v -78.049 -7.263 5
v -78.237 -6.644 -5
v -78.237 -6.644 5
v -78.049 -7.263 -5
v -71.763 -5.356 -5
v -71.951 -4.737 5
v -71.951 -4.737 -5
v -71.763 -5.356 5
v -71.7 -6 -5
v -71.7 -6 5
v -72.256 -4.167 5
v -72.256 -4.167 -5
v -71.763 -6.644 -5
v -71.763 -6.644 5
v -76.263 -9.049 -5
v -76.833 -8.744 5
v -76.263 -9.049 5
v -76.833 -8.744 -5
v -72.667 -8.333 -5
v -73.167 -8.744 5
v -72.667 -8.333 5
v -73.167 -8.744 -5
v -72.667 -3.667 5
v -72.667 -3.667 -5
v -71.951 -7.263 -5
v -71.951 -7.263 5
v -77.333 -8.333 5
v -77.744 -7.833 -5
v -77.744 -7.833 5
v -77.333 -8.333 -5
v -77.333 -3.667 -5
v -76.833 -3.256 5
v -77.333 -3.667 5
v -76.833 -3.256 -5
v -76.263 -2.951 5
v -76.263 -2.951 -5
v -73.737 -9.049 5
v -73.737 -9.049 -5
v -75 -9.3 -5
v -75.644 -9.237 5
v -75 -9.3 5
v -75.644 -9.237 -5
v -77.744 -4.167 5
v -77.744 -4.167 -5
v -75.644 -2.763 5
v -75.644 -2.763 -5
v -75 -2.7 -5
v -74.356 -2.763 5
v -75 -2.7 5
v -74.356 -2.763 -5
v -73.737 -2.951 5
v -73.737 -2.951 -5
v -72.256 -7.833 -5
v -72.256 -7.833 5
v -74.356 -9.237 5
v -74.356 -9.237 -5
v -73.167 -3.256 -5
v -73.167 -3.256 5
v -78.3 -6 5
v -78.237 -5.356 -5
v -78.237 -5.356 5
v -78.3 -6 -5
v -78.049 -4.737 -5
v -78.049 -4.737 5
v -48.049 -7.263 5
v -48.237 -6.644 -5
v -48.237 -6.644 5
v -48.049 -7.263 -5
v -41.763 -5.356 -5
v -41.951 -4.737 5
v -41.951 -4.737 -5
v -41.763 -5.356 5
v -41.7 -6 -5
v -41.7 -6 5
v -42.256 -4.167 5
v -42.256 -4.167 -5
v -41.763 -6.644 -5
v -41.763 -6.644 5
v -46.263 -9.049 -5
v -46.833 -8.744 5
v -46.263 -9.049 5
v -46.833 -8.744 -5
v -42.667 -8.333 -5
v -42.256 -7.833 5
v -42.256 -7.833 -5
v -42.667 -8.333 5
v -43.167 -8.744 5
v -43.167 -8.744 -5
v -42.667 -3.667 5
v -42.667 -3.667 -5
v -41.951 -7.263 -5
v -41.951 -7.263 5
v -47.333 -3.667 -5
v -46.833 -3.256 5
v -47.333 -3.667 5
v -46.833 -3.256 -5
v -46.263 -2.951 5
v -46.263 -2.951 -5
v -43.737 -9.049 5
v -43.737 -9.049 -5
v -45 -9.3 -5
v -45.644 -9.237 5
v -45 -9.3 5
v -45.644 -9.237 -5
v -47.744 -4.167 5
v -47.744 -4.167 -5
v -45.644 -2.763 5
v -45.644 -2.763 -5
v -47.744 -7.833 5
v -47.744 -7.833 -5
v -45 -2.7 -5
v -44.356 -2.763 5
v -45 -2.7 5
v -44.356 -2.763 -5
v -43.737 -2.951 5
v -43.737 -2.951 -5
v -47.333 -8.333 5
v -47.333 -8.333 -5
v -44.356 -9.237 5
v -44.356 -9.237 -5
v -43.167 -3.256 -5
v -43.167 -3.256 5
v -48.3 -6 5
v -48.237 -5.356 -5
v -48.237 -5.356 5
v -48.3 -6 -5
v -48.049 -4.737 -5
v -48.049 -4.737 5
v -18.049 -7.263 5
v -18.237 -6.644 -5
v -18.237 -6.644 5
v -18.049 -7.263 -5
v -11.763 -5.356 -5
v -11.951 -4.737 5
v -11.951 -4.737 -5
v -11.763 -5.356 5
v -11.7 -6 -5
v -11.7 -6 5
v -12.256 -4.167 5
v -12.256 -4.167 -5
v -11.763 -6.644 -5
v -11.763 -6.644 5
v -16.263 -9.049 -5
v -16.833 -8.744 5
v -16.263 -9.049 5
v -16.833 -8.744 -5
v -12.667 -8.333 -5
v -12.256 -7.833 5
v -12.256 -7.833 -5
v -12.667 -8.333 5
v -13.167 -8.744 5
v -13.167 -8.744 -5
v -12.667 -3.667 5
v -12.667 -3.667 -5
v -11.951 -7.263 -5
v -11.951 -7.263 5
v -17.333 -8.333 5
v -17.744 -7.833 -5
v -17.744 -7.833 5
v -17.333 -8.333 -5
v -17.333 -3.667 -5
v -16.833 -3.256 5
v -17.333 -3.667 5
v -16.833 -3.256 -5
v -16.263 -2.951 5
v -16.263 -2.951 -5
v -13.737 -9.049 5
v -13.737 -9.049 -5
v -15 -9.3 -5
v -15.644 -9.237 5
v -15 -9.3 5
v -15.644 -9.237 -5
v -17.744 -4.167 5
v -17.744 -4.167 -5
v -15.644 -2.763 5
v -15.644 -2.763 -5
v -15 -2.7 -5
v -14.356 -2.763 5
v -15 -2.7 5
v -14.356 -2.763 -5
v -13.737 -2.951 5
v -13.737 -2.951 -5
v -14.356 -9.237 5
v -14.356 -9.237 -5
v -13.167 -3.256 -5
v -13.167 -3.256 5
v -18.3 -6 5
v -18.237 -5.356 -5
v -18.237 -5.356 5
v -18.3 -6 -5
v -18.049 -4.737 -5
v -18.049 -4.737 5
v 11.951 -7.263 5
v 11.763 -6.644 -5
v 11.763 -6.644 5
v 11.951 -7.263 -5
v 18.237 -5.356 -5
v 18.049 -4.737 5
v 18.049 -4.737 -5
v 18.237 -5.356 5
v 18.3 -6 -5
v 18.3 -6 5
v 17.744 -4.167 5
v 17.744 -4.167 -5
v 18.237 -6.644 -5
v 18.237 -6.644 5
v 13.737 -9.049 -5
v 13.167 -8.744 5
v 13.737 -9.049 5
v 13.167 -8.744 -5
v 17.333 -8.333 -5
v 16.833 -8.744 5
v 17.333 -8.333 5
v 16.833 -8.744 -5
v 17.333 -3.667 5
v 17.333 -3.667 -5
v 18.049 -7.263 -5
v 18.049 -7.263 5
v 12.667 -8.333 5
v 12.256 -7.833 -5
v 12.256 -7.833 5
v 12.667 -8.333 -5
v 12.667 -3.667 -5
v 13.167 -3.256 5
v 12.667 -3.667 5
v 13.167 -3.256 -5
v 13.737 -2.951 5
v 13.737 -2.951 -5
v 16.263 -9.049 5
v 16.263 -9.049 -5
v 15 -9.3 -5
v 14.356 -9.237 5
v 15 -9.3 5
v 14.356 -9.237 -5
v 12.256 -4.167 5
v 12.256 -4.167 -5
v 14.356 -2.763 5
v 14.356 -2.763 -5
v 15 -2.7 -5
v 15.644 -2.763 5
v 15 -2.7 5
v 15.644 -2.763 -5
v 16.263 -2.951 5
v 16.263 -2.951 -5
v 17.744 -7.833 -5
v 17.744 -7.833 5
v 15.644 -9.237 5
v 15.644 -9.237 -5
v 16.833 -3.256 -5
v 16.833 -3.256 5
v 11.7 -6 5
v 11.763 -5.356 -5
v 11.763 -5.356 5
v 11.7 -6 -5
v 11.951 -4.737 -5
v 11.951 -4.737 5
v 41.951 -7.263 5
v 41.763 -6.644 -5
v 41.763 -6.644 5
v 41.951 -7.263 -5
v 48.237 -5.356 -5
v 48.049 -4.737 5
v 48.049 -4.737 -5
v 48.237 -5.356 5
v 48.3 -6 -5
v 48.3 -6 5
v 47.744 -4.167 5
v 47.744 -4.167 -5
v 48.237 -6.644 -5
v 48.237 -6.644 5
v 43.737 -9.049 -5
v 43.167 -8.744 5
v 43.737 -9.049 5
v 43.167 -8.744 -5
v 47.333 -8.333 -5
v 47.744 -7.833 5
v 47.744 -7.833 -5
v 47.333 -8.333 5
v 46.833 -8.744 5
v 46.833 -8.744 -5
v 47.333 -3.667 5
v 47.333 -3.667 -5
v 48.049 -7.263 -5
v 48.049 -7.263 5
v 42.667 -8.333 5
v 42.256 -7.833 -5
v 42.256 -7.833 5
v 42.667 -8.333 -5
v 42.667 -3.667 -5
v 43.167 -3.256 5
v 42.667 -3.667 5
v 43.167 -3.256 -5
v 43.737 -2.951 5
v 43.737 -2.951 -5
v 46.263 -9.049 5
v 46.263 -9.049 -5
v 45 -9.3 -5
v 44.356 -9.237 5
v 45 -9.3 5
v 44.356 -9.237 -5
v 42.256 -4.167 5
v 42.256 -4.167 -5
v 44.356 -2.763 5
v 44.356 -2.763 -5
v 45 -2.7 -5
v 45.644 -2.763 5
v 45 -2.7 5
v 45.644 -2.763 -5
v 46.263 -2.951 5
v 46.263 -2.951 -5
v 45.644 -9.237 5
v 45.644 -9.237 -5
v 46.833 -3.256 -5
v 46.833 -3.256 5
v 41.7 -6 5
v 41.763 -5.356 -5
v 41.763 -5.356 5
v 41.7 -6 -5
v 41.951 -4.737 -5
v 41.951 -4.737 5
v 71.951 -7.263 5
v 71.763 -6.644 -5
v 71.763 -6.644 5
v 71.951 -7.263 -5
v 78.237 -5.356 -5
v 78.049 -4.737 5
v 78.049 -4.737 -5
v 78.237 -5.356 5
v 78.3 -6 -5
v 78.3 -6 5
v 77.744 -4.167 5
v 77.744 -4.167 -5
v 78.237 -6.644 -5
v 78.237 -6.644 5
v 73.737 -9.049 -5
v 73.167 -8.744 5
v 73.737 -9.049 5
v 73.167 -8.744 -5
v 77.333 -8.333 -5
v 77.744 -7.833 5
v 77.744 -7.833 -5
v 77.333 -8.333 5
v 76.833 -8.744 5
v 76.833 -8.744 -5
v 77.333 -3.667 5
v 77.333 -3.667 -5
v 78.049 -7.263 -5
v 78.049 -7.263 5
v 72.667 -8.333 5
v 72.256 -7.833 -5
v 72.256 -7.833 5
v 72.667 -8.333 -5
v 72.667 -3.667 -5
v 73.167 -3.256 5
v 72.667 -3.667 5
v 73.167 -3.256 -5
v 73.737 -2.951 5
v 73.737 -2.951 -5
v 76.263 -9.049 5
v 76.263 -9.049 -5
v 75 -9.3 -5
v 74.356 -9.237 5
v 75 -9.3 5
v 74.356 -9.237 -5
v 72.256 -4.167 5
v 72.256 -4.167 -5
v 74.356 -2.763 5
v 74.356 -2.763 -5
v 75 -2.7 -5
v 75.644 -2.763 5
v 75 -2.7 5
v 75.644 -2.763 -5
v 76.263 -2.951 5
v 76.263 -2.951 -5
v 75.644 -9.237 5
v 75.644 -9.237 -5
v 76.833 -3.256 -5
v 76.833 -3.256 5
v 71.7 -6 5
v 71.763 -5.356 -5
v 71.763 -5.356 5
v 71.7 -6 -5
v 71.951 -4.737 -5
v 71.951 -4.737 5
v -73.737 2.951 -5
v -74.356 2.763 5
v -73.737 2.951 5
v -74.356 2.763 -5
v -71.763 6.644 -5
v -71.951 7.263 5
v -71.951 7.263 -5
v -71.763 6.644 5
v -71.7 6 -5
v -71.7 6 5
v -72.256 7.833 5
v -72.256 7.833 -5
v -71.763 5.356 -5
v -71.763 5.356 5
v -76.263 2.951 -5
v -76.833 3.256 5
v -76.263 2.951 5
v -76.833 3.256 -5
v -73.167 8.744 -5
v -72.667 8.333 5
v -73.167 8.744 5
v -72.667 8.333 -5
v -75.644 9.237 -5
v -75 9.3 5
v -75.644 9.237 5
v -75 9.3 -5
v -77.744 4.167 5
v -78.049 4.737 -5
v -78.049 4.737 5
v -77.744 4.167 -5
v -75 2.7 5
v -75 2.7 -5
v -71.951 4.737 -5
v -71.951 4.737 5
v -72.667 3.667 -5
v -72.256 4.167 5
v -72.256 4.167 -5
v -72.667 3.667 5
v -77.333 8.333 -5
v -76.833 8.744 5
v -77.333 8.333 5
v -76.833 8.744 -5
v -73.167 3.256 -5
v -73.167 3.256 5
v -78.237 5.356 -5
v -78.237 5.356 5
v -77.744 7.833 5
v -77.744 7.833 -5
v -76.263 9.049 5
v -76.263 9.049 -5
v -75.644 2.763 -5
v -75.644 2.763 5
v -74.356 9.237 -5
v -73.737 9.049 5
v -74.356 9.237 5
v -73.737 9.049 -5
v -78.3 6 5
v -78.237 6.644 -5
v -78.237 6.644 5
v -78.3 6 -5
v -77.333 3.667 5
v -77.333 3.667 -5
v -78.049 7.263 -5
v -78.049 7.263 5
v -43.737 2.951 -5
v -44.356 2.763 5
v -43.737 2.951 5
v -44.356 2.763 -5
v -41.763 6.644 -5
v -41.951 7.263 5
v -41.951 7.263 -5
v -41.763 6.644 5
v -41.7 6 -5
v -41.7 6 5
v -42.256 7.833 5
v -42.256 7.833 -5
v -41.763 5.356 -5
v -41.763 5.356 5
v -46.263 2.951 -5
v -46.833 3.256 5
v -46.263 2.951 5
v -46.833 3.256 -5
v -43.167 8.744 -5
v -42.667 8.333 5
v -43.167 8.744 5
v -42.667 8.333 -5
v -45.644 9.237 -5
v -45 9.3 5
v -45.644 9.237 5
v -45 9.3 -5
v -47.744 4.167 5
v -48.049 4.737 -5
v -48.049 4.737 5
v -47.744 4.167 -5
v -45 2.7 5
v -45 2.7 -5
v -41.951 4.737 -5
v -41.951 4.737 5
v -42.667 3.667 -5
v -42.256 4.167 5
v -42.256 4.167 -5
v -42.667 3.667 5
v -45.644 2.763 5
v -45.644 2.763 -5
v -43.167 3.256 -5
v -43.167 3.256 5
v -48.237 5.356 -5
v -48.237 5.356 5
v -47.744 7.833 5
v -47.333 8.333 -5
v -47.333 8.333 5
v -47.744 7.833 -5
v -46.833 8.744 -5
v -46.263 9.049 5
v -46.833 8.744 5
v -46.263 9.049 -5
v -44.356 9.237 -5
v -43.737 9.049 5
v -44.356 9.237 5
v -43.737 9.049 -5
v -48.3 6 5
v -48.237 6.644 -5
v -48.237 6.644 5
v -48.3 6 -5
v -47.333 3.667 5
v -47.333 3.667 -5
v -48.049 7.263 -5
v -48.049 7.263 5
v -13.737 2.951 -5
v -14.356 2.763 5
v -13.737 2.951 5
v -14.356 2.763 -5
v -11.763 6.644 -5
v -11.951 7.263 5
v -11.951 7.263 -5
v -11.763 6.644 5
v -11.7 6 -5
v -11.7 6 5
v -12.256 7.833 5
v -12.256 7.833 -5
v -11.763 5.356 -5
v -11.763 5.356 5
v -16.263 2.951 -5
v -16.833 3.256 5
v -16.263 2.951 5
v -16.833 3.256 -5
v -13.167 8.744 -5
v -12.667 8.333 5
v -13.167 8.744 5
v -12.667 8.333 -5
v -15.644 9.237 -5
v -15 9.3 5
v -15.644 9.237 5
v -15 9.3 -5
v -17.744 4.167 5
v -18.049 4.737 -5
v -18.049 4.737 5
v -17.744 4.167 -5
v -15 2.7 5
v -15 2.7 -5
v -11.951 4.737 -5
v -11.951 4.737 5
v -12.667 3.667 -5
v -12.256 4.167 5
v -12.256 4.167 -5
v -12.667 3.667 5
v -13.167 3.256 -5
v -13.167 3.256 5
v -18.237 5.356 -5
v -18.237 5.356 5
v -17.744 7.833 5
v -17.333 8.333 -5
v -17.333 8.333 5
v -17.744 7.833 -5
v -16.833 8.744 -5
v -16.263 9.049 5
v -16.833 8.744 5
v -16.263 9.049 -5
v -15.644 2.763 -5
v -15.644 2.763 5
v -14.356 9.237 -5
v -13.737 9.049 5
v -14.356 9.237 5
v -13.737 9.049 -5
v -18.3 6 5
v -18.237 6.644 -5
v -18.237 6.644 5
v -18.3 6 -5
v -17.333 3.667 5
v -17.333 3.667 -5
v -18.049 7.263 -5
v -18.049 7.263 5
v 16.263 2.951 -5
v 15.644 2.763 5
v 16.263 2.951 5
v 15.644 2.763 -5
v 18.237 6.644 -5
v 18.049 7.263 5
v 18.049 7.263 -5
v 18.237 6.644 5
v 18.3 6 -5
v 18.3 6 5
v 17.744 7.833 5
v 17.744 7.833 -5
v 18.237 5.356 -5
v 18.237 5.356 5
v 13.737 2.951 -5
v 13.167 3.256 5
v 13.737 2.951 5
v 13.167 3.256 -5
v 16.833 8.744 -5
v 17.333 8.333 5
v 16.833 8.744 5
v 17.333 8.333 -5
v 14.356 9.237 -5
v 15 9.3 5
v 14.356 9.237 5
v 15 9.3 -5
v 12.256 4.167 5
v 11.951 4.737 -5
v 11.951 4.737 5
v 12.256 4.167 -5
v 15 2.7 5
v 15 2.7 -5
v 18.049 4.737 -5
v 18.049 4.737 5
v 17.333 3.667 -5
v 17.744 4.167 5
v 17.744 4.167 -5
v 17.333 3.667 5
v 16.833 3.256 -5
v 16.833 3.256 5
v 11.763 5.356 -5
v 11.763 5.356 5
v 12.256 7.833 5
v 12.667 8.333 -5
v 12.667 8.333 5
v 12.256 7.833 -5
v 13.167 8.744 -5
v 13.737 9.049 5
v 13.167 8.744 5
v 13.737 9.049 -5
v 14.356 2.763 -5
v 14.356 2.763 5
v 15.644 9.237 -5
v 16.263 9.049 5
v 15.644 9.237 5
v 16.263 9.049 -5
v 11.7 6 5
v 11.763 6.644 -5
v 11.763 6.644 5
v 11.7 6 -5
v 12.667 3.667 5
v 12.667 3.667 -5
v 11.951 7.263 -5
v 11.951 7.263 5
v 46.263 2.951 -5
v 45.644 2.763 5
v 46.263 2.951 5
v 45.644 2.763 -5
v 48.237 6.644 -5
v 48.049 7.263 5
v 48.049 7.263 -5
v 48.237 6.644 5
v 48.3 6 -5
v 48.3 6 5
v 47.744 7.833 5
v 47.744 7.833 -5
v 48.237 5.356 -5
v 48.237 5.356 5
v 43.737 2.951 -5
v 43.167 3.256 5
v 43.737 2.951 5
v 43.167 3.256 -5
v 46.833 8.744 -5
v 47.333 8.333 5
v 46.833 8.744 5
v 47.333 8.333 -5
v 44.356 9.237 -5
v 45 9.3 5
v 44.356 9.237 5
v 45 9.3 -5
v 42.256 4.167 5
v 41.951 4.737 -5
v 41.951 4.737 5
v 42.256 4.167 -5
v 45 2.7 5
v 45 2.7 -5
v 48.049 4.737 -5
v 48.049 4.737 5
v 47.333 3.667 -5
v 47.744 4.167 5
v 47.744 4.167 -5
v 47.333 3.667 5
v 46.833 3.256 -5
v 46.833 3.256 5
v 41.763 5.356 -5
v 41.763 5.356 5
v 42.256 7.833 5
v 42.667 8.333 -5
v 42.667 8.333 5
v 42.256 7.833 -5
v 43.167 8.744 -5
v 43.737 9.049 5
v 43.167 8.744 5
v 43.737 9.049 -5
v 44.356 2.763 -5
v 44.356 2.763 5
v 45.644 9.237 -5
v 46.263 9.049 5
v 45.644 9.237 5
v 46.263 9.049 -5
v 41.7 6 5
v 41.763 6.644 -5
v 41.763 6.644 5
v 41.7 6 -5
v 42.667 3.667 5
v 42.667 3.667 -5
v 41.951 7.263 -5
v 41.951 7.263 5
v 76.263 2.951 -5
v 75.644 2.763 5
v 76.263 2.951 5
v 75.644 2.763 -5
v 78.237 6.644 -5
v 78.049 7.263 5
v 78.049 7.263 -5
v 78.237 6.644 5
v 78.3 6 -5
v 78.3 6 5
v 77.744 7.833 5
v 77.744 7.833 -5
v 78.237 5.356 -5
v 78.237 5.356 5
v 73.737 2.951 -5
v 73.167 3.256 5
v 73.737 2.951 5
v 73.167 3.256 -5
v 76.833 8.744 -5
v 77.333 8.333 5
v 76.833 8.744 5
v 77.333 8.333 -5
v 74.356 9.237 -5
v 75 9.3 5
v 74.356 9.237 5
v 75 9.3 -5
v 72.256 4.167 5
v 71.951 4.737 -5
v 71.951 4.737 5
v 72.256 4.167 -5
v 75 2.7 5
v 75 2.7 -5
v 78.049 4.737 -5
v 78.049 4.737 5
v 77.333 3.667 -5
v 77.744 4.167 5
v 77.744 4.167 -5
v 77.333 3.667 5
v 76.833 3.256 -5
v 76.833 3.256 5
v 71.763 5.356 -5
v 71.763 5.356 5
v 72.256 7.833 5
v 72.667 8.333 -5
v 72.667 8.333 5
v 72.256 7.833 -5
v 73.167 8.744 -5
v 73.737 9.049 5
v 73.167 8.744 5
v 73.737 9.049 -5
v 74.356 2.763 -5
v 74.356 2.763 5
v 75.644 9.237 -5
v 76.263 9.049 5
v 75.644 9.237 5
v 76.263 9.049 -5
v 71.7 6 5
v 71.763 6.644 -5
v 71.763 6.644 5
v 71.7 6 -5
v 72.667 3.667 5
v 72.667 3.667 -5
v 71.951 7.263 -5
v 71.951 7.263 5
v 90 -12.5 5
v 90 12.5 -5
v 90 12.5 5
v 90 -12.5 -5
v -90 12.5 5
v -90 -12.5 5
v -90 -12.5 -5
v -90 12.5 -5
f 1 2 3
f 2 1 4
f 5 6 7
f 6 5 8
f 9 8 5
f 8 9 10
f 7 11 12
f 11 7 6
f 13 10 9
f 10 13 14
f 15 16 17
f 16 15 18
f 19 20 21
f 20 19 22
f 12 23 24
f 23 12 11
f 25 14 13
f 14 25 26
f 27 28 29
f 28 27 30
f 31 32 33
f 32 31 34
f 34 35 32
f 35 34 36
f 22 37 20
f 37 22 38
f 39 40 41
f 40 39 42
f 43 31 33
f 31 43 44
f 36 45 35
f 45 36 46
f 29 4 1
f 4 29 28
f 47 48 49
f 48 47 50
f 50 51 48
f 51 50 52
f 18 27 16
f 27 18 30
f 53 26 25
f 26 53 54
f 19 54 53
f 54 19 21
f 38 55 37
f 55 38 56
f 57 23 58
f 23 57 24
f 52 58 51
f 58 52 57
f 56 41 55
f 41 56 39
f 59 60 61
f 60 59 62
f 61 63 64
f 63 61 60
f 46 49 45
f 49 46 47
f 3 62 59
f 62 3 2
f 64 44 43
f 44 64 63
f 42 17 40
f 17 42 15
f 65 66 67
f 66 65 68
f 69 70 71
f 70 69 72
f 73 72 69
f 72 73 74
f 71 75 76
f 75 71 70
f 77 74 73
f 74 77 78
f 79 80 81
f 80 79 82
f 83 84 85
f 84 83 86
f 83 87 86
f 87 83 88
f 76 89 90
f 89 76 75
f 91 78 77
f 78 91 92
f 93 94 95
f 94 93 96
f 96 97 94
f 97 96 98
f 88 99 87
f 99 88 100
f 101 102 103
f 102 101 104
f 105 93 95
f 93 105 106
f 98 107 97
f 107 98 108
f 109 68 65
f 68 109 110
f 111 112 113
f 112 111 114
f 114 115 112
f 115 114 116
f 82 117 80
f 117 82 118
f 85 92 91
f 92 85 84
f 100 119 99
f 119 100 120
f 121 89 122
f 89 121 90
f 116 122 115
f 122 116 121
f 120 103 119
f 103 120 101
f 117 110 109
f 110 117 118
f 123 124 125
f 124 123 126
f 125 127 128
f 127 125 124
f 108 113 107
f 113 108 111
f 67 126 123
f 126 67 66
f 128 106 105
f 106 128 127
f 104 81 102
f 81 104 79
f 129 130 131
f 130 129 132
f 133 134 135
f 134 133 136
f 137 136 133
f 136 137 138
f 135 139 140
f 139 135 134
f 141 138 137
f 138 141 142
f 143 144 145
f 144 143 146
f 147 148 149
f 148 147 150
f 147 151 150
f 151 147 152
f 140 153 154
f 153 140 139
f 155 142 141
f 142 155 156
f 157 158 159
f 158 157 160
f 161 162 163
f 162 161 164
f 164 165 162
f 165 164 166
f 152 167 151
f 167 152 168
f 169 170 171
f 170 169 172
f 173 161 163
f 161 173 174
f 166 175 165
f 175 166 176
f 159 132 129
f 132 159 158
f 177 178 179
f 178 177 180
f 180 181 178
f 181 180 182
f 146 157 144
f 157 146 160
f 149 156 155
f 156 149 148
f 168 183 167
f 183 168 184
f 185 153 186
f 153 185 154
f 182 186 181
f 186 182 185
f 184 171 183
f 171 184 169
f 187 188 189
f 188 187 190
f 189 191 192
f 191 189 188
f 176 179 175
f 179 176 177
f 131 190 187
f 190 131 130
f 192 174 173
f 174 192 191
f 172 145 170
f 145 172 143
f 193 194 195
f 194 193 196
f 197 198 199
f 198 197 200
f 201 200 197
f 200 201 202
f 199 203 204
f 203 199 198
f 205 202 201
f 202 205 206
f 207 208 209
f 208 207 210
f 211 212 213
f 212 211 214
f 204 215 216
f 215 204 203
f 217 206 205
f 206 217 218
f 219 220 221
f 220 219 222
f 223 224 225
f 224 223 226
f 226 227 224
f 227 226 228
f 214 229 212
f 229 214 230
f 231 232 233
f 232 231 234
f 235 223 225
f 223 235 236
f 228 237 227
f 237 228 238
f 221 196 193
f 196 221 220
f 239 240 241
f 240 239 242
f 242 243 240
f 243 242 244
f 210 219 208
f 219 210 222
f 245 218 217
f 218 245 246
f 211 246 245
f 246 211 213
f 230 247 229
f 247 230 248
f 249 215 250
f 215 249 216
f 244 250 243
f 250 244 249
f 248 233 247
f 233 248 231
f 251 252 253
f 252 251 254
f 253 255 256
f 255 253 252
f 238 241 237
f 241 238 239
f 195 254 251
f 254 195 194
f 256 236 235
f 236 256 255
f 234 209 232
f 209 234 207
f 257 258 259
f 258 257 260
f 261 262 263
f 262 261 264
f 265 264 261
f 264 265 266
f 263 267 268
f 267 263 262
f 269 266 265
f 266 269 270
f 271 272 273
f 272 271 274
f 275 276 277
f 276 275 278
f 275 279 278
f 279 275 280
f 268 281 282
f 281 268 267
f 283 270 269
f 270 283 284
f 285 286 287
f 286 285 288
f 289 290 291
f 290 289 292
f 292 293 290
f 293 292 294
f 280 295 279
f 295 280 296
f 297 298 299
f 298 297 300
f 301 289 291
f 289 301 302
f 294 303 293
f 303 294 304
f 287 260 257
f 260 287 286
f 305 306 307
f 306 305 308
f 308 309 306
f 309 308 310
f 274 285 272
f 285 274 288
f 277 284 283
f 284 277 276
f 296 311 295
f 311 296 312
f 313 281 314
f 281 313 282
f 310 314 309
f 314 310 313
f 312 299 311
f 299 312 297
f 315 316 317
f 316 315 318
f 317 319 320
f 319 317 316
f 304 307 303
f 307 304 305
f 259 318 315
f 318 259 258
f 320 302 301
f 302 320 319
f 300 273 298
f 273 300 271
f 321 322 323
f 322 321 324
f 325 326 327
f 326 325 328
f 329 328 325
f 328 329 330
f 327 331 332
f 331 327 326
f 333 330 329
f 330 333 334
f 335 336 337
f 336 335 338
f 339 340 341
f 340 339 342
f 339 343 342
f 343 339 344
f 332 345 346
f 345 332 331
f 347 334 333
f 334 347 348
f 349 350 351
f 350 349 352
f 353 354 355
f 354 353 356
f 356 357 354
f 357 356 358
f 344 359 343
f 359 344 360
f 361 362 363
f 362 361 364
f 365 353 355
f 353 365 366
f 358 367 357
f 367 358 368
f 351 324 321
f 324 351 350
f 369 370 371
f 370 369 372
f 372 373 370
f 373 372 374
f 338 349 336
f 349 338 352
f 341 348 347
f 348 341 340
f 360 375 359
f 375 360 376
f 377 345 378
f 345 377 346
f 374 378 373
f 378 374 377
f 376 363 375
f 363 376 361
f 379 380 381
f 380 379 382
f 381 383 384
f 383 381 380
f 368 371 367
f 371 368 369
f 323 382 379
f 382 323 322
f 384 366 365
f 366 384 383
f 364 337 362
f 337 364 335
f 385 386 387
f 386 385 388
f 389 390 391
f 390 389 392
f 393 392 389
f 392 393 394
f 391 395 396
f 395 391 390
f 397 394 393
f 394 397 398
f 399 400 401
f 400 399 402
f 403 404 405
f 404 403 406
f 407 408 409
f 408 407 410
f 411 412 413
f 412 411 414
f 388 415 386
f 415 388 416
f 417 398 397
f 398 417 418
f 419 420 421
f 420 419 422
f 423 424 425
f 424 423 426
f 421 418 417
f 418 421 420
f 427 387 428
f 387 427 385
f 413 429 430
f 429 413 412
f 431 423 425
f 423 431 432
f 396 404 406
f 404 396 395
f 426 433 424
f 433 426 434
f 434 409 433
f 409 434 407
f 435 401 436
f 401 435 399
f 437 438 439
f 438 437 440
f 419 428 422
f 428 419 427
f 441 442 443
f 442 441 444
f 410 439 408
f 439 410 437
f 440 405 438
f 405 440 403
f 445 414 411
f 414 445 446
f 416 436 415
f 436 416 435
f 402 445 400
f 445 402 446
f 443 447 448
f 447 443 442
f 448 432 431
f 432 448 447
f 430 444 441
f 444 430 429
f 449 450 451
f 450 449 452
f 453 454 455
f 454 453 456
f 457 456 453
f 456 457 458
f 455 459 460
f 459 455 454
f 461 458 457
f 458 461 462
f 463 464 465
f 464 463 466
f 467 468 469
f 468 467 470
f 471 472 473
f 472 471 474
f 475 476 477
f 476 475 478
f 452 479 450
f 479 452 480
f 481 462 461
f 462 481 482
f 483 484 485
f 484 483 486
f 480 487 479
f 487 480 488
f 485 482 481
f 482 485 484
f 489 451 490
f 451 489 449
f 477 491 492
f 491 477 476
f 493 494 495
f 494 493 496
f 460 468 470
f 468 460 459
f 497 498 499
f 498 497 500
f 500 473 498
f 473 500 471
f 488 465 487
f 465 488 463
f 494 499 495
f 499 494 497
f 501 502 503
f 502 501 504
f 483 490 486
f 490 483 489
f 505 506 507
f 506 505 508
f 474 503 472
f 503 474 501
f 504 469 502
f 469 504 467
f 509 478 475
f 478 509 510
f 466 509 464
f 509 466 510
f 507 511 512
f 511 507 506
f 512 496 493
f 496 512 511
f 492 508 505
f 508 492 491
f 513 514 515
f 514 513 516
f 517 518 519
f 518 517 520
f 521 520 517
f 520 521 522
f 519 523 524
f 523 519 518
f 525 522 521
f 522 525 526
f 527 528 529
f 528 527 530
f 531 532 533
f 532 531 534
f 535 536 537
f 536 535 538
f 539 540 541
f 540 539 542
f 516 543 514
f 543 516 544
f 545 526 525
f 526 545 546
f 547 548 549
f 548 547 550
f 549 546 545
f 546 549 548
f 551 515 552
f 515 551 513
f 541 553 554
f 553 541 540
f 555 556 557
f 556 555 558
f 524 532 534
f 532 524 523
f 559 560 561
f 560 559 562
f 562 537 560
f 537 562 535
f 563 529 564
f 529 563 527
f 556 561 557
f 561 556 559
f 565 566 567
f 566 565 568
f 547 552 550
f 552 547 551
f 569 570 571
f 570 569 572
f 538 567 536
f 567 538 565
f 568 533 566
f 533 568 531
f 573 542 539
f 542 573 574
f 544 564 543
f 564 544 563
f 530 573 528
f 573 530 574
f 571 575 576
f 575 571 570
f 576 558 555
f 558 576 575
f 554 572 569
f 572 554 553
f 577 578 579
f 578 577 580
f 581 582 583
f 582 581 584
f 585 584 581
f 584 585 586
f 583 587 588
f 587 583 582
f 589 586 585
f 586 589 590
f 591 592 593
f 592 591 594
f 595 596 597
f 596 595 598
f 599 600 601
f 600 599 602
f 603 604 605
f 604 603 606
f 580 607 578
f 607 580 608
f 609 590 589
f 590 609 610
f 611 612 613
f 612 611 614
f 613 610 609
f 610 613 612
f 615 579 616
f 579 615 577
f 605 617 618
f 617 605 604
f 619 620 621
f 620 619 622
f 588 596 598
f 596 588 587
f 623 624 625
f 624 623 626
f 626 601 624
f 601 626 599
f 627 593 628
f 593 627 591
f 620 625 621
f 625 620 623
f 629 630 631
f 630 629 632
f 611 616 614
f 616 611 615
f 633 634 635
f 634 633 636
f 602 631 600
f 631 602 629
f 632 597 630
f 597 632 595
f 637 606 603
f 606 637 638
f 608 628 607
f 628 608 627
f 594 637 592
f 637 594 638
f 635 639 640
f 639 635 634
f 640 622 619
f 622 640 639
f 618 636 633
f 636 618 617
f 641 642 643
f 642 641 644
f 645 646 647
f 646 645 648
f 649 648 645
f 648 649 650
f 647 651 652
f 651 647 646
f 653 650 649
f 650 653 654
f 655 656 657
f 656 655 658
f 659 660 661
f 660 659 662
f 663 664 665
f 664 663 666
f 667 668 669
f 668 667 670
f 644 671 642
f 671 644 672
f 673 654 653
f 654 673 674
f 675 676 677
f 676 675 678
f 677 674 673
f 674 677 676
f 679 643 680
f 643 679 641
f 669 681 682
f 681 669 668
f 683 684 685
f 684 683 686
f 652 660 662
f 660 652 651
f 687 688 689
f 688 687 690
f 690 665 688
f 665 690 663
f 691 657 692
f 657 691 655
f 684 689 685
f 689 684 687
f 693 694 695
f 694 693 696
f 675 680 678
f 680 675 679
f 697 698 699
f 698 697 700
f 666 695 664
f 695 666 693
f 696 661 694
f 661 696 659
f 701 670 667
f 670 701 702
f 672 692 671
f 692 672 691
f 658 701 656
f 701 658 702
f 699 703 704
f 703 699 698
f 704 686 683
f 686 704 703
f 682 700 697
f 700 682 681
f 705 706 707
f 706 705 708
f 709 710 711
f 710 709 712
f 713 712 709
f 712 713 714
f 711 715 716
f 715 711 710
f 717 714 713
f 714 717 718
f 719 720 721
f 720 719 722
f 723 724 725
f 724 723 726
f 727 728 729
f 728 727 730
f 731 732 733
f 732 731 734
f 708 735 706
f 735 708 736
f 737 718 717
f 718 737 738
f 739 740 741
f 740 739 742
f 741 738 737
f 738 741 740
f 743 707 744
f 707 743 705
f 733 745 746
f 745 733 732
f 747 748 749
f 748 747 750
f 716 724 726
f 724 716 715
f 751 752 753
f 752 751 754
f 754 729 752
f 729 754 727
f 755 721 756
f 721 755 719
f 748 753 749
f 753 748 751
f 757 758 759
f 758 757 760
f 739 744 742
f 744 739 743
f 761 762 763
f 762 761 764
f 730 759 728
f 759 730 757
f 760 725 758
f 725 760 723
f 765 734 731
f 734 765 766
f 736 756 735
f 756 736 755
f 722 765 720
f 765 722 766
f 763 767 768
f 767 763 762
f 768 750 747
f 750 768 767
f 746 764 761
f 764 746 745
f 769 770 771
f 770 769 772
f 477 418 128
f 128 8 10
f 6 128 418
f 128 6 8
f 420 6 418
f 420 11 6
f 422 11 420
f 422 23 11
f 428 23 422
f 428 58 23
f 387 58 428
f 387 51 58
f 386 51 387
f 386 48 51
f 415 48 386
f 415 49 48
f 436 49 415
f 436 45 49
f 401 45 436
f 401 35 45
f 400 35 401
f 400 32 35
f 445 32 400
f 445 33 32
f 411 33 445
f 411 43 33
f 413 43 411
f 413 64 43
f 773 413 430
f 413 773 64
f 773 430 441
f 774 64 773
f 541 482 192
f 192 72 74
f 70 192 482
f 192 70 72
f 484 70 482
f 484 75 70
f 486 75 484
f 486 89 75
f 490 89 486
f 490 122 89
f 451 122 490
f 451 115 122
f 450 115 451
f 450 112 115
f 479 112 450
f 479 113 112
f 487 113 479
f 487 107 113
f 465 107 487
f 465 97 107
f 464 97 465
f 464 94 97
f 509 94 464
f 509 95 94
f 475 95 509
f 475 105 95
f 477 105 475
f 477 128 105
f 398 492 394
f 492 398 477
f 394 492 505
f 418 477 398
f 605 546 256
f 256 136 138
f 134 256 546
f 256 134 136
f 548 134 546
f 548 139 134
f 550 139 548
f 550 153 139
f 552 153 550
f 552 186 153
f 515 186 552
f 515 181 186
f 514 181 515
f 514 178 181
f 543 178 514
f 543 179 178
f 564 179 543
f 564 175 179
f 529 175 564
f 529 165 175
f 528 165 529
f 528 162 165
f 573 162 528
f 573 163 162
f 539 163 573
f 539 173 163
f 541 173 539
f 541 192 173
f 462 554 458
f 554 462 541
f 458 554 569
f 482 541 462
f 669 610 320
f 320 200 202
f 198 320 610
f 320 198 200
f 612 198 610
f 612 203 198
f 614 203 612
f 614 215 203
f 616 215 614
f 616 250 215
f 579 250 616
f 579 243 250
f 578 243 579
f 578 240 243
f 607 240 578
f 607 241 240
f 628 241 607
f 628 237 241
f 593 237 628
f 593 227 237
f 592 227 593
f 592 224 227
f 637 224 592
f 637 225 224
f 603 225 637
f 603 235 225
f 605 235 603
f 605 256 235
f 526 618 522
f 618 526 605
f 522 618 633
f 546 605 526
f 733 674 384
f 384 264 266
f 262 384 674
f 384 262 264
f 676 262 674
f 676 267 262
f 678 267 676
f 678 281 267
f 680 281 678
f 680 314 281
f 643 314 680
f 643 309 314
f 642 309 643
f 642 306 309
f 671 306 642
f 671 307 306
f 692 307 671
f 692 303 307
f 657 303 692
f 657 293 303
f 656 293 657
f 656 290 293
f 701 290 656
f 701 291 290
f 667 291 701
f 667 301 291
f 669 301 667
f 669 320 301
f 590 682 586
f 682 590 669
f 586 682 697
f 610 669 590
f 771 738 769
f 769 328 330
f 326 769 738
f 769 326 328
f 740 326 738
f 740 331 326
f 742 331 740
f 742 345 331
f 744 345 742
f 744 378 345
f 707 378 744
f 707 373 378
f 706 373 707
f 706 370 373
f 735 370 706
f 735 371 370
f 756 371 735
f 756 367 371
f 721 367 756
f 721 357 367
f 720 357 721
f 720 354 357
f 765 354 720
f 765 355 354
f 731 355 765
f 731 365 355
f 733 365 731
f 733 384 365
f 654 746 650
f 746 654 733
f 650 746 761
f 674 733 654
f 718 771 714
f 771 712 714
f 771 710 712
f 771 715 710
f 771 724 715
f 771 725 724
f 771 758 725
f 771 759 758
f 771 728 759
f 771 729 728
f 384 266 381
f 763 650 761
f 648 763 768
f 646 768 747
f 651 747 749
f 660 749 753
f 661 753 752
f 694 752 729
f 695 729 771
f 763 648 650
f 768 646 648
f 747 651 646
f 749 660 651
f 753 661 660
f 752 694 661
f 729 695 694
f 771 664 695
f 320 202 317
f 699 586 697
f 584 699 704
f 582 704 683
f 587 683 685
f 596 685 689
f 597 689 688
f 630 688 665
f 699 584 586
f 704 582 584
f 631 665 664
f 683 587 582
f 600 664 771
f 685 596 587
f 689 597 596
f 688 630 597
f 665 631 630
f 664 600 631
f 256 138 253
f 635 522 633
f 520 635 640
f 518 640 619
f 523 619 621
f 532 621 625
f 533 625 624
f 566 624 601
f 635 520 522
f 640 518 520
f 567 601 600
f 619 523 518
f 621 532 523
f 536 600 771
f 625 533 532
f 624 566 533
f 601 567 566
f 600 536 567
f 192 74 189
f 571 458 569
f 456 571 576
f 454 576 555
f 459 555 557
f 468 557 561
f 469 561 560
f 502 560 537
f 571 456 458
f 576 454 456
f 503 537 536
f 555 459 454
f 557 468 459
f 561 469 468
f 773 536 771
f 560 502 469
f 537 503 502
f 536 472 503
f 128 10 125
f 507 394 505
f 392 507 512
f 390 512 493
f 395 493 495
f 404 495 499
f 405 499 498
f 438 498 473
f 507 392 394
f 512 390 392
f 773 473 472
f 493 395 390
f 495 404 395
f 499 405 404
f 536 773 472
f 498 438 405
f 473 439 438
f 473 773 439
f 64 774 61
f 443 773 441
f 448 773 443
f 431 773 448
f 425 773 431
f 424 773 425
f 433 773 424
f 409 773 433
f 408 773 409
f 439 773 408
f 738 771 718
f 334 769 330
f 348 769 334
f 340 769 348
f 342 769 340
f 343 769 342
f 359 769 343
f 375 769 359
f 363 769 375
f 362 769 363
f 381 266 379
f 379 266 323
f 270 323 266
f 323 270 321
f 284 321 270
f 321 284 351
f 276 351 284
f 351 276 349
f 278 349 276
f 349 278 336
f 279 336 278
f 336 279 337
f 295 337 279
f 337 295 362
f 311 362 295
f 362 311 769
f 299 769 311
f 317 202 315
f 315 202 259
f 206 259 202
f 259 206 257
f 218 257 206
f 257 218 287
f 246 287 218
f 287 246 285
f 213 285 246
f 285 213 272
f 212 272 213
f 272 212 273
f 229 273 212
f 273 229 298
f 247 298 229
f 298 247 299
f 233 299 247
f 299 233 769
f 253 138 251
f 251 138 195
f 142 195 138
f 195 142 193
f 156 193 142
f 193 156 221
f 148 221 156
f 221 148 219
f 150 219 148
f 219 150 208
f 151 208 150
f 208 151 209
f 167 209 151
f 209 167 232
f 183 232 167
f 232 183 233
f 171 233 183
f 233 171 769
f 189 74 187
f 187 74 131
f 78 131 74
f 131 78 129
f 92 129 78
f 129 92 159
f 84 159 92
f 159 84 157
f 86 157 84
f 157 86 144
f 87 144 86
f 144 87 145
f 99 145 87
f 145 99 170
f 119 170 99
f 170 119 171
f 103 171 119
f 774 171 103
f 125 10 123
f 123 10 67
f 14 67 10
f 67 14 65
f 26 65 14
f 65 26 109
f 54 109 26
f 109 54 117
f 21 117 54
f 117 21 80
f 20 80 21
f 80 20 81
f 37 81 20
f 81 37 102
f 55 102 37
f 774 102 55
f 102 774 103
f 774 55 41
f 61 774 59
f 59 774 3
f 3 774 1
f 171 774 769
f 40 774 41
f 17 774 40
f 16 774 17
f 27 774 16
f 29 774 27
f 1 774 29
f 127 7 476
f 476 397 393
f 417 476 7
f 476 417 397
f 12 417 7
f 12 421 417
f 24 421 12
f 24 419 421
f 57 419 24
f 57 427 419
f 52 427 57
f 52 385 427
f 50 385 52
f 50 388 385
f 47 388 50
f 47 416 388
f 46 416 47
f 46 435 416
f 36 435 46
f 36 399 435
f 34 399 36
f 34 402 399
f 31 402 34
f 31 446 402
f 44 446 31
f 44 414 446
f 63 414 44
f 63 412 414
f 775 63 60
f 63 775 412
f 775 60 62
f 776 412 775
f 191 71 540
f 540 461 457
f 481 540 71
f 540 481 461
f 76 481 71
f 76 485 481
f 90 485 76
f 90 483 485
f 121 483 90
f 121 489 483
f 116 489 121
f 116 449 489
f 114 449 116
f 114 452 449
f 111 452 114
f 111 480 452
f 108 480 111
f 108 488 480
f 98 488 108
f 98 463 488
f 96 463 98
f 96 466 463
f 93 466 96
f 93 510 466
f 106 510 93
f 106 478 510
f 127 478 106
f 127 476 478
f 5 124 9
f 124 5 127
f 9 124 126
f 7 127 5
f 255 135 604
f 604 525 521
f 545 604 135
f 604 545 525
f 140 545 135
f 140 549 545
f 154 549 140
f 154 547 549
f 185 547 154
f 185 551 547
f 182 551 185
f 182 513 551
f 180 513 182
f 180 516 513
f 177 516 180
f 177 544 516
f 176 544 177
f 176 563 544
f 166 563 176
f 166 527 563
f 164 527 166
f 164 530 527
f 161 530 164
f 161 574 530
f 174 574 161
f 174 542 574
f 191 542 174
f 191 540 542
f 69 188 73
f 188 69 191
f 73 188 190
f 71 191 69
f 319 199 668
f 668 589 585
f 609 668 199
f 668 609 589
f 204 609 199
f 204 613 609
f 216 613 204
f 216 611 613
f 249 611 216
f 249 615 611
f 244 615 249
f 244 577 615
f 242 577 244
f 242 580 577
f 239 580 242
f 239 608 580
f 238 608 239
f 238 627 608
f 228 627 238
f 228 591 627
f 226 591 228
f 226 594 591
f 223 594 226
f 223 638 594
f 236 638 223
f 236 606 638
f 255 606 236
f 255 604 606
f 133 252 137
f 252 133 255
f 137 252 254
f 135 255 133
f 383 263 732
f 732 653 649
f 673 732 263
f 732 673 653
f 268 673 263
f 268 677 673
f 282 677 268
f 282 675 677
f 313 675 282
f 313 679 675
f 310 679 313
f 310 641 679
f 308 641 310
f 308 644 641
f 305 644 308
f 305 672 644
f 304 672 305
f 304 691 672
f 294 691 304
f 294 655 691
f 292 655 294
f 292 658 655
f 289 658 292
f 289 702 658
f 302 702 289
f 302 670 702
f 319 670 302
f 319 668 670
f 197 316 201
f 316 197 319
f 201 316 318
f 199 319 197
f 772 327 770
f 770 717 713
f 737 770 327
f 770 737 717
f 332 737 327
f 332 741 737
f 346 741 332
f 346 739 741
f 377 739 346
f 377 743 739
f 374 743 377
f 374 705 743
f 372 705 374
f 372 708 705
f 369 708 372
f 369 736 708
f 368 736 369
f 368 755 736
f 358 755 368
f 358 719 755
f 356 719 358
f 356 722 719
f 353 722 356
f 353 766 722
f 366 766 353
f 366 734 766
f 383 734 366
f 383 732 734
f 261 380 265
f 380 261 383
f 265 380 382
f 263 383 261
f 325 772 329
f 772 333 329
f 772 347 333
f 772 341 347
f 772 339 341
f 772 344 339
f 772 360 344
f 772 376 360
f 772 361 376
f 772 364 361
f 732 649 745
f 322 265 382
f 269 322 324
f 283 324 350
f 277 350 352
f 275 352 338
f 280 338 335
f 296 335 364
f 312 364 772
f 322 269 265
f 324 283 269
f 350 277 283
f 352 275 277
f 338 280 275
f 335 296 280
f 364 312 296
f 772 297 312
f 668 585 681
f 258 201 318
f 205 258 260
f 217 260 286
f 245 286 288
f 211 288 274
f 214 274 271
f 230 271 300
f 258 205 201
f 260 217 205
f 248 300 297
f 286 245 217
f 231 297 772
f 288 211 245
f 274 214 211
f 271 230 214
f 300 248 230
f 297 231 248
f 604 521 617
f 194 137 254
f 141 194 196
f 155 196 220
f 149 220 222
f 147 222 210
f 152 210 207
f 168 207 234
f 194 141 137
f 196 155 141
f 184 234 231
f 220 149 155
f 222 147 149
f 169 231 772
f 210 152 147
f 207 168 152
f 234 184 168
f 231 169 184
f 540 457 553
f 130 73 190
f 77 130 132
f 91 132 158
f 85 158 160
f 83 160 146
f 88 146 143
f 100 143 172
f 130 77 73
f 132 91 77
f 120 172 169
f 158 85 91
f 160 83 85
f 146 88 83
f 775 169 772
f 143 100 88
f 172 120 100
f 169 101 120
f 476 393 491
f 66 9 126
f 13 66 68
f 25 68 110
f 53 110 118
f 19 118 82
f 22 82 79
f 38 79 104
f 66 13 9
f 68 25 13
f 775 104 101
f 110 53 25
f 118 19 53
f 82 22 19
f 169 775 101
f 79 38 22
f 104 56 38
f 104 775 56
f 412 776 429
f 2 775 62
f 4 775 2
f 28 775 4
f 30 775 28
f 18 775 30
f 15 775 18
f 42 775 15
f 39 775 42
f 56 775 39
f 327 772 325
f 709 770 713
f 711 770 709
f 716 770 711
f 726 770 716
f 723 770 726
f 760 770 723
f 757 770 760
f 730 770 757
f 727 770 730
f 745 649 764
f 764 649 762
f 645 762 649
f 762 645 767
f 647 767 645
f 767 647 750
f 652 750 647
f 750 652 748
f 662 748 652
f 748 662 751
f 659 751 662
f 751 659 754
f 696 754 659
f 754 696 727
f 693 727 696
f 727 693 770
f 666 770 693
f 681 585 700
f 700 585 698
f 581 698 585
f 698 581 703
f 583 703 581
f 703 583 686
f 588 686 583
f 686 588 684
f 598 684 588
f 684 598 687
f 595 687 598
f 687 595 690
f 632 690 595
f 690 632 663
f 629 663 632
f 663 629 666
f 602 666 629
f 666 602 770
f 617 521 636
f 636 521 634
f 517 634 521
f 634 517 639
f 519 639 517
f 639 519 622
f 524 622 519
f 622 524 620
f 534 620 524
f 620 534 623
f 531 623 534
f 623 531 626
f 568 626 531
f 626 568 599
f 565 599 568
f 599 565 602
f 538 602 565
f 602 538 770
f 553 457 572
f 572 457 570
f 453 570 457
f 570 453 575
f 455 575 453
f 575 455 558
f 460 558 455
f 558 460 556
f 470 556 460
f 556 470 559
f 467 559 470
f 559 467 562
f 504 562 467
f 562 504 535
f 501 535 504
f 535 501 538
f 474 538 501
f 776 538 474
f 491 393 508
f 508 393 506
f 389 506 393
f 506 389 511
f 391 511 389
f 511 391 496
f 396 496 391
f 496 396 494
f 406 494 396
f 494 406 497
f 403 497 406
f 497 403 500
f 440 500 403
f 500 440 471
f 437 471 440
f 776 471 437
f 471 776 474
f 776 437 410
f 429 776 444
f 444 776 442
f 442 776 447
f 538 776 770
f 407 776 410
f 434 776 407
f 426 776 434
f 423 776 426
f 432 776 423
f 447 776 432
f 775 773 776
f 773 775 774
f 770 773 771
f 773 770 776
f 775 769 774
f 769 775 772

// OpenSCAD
$fn = 32;

// ----------------------------------------------------------------------
// Hole bar, 6 x Ø6.6
// tworows layout, 15 mm edge offset
// ----------------------------------------------------------------------

// --- parameters (mm) ---
bar_w = 25;       // bar width (Y)
bar_t = 10;       // bar thickness (Z)
holes = 6;        // holes per row
hole_d = 6.6;     // hole diameter
edge = 15;        // offset from the bar end to the first hole
pitch = 30;       // pitch between neighbouring holes
row_offset = 12;  // distance between the two rows

// --- derived feature positions (mm) ---
span = (holes - 1) * pitch;   // = 150   distance between the end holes
bar_l = span + 2 * edge;      // = 180   overall bar length
start_x = -bar_l / 2 + edge;  // = -75   X of the first hole
feature_centers = [
  [start_x + 0 * pitch, -row_offset / 2],
  [start_x + 1 * pitch, -row_offset / 2],
  [start_x + 2 * pitch, -row_offset / 2],
  [start_x + 3 * pitch, -row_offset / 2],
  [start_x + 4 * pitch, -row_offset / 2],
  [start_x + 5 * pitch, -row_offset / 2]
];   // hole centres of the first row
row2_centers = [
  [start_x + 0 * pitch, row_offset / 2],
  [start_x + 1 * pitch, row_offset / 2],
  [start_x + 2 * pitch, row_offset / 2],
  [start_x + 3 * pitch, row_offset / 2],
  [start_x + 4 * pitch, row_offset / 2],
  [start_x + 5 * pitch, row_offset / 2]
];   // hole centres of the second row

// bar with two rows of holes, both read from their own centre arrays
difference() {
  translate([-bar_l / 2, -bar_w / 2, -bar_t / 2]) cube([bar_l, bar_w, bar_t]);
  for (centre = feature_centers)
    translate([centre[0], centre[1], 0])
      cylinder(d = hole_d, h = bar_t + 2, center = true);
  for (centre = row2_centers)
    translate([centre[0], centre[1], 0])
      cylinder(d = hole_d, h = bar_t + 2, center = true);
}
